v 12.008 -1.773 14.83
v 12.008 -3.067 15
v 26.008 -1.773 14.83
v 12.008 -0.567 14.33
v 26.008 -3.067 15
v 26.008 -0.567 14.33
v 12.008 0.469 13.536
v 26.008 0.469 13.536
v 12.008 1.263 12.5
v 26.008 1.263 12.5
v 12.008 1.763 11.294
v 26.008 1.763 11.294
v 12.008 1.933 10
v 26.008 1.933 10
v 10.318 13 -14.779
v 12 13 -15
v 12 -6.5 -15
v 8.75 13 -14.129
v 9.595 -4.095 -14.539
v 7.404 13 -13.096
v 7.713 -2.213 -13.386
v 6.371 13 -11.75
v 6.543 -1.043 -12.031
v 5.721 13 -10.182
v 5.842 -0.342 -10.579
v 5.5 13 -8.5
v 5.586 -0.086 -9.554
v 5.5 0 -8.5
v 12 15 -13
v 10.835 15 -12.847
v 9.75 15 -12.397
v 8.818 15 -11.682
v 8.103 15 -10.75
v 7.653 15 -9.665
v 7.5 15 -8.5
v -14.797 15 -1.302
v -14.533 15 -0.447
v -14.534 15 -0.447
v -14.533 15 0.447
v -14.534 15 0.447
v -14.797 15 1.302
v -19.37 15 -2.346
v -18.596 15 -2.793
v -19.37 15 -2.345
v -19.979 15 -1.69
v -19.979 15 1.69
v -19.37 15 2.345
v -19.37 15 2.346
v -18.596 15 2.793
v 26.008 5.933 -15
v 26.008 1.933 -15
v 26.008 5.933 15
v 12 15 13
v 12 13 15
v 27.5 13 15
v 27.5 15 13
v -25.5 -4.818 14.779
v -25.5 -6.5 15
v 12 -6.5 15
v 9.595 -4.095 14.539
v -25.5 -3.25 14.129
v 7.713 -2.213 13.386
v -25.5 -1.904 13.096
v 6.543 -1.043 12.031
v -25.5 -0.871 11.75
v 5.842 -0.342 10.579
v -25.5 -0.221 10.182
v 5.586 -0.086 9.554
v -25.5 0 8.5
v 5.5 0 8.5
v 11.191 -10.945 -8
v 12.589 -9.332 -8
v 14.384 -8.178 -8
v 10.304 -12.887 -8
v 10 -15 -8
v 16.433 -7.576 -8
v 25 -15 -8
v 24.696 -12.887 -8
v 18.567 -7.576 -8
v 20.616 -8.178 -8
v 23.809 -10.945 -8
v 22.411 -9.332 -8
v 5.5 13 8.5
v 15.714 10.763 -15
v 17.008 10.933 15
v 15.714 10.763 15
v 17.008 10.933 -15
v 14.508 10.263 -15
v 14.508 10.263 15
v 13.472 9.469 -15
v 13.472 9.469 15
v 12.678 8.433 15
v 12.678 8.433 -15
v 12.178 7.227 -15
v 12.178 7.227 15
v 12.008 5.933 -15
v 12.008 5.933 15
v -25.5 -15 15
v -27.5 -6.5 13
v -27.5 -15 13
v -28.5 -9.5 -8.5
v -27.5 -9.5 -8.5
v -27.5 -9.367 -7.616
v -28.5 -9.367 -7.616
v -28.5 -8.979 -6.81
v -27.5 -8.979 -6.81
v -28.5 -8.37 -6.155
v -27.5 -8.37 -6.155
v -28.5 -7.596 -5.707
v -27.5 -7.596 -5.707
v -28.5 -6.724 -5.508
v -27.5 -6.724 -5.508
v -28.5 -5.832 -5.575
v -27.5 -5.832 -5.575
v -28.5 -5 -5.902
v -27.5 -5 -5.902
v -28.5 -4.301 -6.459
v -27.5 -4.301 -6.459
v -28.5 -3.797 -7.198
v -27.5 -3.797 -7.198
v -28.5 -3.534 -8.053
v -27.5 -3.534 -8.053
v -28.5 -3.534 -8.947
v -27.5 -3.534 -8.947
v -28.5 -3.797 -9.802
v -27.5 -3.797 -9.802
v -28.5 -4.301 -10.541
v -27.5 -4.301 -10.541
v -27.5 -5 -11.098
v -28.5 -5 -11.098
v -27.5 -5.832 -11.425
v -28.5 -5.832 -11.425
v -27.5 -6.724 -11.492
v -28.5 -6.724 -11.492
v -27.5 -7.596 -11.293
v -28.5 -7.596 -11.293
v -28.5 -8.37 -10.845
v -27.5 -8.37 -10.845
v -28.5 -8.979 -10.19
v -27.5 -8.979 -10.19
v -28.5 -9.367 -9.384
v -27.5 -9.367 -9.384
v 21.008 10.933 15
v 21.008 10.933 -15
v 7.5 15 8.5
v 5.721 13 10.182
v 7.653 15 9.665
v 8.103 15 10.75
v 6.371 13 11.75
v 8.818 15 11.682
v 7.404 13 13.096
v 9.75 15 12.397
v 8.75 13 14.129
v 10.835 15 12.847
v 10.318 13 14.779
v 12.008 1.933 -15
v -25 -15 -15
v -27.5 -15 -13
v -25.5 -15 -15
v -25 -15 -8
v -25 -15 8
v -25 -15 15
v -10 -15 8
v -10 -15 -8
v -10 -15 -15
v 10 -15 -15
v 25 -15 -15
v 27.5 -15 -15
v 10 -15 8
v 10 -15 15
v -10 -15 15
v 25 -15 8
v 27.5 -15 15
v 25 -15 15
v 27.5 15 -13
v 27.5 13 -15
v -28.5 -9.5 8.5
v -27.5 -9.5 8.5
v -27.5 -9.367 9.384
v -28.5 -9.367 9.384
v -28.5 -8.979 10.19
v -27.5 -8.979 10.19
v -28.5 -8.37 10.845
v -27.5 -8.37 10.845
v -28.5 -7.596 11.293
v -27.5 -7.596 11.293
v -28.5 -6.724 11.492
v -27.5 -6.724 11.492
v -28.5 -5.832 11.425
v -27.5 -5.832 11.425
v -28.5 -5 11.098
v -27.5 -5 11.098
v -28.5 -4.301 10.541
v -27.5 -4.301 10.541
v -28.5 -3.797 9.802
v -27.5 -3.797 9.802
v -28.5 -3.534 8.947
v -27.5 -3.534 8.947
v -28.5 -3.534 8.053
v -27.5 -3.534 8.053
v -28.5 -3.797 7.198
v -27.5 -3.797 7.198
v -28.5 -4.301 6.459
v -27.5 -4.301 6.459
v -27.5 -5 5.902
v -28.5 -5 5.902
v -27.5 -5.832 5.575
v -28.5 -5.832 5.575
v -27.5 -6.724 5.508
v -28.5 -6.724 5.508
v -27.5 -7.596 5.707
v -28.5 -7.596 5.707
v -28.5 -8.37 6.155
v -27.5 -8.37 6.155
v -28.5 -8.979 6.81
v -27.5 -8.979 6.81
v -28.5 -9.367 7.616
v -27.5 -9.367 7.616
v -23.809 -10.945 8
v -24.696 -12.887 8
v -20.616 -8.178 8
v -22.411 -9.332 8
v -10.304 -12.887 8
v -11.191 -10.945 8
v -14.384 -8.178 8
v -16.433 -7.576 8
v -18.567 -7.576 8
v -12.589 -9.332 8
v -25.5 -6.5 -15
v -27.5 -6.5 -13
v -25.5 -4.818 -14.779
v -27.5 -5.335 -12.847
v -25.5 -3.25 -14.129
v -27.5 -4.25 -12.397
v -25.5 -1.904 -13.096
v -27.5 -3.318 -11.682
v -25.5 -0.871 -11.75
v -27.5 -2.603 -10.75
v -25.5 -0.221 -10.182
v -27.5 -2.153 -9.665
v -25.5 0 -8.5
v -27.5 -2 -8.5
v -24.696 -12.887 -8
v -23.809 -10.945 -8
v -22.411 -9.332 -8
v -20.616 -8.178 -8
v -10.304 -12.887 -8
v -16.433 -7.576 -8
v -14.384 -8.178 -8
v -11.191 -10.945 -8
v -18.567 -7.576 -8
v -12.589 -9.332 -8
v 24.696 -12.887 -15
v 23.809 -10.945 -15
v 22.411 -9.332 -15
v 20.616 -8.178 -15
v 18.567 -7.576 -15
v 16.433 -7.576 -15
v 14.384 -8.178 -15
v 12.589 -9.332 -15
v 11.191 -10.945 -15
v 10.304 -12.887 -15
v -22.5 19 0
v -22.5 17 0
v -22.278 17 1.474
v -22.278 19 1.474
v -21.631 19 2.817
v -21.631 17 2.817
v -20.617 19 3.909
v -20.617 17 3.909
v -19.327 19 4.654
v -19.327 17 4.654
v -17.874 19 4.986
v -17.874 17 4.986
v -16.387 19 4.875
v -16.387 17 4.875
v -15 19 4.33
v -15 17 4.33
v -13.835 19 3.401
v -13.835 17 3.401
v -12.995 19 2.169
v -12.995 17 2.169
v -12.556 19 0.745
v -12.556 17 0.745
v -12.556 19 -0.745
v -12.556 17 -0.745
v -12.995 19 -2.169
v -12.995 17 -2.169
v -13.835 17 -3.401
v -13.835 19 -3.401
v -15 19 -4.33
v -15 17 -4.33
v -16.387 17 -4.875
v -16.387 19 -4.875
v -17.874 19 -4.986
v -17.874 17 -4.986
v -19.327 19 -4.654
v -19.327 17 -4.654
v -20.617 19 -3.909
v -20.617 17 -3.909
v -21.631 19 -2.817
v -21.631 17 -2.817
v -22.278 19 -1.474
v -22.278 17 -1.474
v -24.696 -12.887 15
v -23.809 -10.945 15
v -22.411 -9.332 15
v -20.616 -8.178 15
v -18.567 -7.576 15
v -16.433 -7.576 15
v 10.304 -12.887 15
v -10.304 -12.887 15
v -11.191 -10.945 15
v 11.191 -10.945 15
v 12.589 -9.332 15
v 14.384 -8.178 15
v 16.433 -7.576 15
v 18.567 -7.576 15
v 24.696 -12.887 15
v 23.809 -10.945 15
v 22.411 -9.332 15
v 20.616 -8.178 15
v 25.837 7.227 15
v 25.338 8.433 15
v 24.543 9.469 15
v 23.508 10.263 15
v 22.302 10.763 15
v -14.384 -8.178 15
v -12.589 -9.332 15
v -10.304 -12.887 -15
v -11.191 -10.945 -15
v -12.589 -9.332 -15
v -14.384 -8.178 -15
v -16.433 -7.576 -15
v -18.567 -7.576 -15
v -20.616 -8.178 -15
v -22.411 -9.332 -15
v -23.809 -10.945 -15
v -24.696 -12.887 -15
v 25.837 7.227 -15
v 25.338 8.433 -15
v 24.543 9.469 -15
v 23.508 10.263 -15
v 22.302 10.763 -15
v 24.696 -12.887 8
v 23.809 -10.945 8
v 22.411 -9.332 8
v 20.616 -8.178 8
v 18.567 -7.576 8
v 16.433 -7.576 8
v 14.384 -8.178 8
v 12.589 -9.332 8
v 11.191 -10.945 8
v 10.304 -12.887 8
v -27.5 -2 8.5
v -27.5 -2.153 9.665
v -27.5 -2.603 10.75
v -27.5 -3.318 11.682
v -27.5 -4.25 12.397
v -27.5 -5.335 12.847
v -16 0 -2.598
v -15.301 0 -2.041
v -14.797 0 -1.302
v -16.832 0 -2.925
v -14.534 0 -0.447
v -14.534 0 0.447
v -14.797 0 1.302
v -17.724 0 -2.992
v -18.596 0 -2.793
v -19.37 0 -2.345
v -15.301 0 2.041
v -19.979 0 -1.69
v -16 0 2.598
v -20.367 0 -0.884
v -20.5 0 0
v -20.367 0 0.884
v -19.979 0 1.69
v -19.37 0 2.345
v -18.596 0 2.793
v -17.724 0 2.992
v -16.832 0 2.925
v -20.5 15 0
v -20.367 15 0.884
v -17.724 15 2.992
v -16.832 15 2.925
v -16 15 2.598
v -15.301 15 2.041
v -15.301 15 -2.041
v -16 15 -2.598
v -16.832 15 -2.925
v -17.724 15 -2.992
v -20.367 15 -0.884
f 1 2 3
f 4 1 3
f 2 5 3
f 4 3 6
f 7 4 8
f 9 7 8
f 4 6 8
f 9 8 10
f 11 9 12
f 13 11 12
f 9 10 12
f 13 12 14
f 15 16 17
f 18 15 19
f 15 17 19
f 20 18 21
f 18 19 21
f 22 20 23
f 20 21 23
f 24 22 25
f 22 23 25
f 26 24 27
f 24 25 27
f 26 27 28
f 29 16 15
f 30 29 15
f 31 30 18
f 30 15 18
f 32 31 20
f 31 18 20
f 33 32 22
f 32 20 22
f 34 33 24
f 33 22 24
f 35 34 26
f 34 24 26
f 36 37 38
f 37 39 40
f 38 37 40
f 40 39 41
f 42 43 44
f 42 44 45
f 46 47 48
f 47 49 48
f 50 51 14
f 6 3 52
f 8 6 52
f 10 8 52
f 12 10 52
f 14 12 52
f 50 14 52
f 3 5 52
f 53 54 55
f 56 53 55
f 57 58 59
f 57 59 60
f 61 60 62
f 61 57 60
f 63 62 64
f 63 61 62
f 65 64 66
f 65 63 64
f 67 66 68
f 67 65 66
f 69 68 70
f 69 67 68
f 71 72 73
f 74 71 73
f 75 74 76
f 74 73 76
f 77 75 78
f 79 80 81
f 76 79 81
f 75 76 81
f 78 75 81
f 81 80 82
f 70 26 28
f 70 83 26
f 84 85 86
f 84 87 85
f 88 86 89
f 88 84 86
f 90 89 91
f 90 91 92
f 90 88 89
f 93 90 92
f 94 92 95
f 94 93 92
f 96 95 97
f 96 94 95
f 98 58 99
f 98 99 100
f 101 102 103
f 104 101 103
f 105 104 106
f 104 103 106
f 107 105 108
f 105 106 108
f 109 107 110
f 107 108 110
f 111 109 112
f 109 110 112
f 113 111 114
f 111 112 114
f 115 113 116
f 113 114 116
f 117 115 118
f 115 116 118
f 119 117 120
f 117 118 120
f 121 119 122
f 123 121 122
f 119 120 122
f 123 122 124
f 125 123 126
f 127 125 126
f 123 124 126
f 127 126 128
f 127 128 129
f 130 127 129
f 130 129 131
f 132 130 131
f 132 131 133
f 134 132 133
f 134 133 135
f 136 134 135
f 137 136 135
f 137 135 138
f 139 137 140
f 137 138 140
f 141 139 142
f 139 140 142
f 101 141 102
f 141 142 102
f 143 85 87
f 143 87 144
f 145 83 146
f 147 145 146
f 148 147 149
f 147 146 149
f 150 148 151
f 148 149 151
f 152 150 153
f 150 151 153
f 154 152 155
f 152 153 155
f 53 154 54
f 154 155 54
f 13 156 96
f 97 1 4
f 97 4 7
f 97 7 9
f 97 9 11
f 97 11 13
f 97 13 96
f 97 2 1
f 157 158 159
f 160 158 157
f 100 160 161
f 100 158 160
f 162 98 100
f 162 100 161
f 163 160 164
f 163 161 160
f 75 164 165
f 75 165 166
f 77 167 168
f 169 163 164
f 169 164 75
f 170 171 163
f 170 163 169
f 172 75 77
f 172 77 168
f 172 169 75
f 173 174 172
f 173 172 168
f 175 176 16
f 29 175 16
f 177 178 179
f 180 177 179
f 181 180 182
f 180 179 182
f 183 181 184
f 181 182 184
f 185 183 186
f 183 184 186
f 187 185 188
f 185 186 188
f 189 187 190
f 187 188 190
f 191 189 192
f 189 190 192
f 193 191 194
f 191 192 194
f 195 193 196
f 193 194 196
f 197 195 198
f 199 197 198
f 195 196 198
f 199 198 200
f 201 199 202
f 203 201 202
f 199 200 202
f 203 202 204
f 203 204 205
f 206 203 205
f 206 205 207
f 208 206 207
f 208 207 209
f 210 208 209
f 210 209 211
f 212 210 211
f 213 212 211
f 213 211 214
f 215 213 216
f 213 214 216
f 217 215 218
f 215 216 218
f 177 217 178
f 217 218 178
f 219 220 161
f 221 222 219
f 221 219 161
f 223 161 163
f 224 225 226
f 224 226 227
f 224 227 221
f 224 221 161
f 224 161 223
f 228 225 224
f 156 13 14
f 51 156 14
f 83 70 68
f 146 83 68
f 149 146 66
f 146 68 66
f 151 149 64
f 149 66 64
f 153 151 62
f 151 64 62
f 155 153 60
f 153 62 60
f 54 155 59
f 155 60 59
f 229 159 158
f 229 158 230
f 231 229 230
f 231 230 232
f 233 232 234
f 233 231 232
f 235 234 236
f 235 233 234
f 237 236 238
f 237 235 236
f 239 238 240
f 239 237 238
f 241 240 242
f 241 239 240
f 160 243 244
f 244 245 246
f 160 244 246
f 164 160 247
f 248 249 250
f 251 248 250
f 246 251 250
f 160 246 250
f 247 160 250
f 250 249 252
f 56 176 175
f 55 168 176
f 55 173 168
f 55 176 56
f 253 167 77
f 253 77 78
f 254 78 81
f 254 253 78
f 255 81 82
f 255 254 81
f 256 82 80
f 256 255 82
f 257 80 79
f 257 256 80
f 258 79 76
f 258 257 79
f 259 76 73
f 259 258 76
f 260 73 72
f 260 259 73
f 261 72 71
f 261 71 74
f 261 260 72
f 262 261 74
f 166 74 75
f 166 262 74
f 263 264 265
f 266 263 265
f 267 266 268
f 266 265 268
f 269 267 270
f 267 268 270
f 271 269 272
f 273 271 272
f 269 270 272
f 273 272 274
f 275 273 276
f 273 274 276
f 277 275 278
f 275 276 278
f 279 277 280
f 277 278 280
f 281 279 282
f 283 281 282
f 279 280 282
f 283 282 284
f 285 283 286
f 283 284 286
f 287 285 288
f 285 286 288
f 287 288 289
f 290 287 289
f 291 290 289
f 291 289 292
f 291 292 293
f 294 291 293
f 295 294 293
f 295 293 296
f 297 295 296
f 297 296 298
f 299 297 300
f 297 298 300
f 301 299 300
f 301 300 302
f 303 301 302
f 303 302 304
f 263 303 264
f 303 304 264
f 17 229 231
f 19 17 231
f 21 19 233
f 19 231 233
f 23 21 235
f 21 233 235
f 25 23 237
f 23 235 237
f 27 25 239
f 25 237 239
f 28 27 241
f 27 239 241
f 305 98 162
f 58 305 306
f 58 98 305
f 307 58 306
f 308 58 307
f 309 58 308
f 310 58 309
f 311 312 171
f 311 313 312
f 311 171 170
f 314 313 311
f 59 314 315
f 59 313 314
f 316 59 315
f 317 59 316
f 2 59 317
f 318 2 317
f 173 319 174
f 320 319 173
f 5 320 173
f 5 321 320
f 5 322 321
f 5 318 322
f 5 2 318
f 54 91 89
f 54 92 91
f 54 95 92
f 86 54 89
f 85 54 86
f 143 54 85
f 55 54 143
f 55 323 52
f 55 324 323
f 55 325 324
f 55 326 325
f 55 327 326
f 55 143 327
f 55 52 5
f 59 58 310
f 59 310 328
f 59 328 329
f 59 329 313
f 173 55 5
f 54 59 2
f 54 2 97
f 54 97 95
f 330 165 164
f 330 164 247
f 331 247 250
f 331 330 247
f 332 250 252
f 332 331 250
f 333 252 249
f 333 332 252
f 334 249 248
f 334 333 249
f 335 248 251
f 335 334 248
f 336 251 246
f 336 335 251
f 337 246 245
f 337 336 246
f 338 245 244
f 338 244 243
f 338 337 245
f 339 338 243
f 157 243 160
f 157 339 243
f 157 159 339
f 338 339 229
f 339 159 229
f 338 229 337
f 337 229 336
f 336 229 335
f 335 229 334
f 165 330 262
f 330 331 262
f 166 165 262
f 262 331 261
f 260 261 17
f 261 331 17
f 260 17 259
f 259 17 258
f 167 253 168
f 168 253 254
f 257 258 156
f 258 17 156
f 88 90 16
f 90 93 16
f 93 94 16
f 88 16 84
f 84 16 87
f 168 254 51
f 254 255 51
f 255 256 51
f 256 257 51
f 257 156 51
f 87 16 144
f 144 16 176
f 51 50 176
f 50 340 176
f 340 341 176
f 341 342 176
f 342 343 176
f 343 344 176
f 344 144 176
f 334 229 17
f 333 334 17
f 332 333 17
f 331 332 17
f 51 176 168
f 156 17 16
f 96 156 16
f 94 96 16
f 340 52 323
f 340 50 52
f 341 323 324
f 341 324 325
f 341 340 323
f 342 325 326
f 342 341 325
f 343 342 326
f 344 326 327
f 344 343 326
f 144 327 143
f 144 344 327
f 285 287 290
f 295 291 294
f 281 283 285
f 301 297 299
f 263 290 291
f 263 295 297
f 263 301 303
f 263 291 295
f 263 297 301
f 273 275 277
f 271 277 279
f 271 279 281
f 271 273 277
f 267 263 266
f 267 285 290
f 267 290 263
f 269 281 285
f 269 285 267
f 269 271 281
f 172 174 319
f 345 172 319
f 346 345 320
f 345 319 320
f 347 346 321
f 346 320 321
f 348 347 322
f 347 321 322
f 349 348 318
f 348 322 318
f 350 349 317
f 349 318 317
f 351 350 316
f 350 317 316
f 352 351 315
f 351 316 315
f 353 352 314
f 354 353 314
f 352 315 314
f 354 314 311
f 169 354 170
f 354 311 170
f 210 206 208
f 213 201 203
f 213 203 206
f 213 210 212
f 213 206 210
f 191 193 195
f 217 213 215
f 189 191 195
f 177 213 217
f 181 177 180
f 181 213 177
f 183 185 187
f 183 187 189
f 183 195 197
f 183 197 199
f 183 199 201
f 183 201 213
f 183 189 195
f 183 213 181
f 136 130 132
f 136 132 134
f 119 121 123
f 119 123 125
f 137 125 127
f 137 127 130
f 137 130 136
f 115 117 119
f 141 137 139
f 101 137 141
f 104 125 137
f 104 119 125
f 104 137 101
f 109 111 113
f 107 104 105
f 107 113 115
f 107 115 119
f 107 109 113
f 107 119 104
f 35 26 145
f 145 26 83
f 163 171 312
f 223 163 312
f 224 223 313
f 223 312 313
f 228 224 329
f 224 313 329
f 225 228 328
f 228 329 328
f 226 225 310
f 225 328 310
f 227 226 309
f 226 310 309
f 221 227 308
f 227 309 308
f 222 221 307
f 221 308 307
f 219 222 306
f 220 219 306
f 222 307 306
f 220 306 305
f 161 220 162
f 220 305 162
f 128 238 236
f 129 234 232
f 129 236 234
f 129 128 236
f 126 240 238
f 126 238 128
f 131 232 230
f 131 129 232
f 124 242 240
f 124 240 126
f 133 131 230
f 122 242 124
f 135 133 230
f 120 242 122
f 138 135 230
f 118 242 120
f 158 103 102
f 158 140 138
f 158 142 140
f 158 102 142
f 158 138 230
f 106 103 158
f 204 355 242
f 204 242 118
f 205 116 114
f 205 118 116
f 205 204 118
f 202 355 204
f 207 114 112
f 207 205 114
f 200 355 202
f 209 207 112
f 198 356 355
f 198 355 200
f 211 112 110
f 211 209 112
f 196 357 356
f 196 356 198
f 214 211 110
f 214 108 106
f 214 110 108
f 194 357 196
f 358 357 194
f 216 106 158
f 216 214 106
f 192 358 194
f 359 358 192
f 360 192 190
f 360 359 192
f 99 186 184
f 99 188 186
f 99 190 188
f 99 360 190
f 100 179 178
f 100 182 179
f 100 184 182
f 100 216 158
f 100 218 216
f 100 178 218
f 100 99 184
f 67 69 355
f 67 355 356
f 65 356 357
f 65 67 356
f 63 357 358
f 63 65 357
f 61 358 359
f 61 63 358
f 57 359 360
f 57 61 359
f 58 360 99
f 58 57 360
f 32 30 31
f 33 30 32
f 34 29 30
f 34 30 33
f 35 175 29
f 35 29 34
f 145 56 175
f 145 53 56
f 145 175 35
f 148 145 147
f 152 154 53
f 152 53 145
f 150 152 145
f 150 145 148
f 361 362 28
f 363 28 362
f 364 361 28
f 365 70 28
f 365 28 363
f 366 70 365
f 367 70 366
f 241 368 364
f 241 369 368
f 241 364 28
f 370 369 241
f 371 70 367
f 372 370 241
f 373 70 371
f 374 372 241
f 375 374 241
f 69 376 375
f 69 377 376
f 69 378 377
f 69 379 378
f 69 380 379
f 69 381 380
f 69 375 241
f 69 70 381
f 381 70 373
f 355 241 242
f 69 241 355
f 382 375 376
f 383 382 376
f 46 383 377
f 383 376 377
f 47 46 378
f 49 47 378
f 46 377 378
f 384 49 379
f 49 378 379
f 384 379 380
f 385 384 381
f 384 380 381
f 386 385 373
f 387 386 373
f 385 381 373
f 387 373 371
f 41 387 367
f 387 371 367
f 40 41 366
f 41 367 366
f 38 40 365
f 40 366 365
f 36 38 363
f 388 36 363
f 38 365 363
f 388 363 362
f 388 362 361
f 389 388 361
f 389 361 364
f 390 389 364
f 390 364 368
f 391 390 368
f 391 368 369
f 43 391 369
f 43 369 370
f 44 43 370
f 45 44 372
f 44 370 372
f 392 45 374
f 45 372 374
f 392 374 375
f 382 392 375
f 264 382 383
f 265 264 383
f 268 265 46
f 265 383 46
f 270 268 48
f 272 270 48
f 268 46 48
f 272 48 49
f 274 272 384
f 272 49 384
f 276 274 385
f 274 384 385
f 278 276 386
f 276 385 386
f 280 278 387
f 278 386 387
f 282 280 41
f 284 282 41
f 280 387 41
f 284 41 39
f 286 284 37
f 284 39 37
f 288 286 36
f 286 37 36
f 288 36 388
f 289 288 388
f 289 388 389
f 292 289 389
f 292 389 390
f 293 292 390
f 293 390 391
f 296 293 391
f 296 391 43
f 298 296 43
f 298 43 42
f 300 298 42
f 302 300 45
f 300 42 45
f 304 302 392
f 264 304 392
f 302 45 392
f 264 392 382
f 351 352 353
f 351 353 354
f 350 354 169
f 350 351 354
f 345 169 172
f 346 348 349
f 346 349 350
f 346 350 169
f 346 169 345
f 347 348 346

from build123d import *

# Parameters (mm, degrees)
F1_DEPTH  = 15
F3_DEPTH  = 7
F4_R      = 6.5
F5_SIZE   = 2
F6_W      = 14
F6_H      = 9
F7_DEPTH  = 30.001
F8_R      = 5
F9_R      = 3
F10_DEPTH = 1
F11_R     = 3
F12_DEPTH = 15
F13_R     = 5
F14_DEPTH = 4
F15_SIZE  = 1.99999


# Not quite as in the source:
# - a fillet or chamfer is up to 0.001 mm smaller than in the source, because OpenCascade refuses the exact size
# - a pattern or mirror of a feature is missing from the dataset's text; its kind, count and spacing are read off the source's solid


with BuildPart() as f1:
    # F0 (on Top) → F1 (new body, symmetric)
    with BuildSketch(Plane.XY):
        Polygon((27.5, 15), (5.5, 15), (5.5, 0), (-27.5, 0), (-27.5, -15), (27.5, -15), align=None)
    extrude(amount=F1_DEPTH, both=True)

    # F2 (on face) → F3 (cut)
    with BuildSketch(Plane.XY.offset(15)):
        with BuildLine():
            Line((-25, -15), (-10, -15))
            ThreePointArc((-10, -15), (-17.5, -7.5), (-25, -15))
        make_face()
        with BuildLine():
            ThreePointArc((25, -15), (17.5, -7.5), (10, -15))
            Line((10, -15), (25, -15))
        make_face()
    f3 = extrude(amount=-F3_DEPTH, mode=Mode.SUBTRACT)

    # F3_copies: F3 across plane
    add(f3.mirror(Plane(origin=(0, 0, 0), x_dir=(-1, 0, 0), z_dir=(0, 0, -1))), mode=Mode.SUBTRACT)

    # F4
    f4_edges = [f1.edges().sort_by_distance(p)[0] for p in [
        (-11, 0, 15),
        (-11, 0, -15),
        (5.5, 7.5, 15),
        (5.5, 7.5, -15),
    ]]
    fillet(f4_edges, radius=F4_R)

    # F5
    f5_edges = [f1.edges().sort_by_distance(p)[0] for p in [
        (5.5, 15, 0),
        (-27.5, 0, 0),
    ]]
    chamfer(f5_edges, length=F5_SIZE)

    # F6 (on face) → F7 (cut, through all)
    with BuildSketch(Plane.XY.offset(15)):
        with Locations((19.0077603161, 6.4331619842)):
            Rectangle(F6_W, F6_H)
    extrude(amount=-F7_DEPTH, mode=Mode.SUBTRACT)

    # F8
    f8_edges = [f1.edges().sort_by_distance(p)[0] for p in [
        (19.00776, 1.933162, 15),
        (26.00776, 10.933162, 0),
        (12.00776, 10.933162, 0),
    ]]
    fillet(f8_edges, radius=F8_R)

    # F9 (on face) → F10 (join)
    with BuildSketch(Plane(origin=(-27.5, 0, 0), x_dir=(0, -1, 0), z_dir=(-1, 0, 0))):
        with Locations((6.5, 8.5)):
            Circle(F9_R)
        with Locations((6.5, -8.5)):
            Circle(F9_R)
    extrude(amount=F10_DEPTH)

    # F11 (on face) → F12 (join)
    with BuildSketch(Plane(origin=(0, 0, 0), x_dir=(-1, 0, 0), z_dir=(0, 1, 0))):
        with Locations((17.5, 0)):
            Circle(F11_R)
    extrude(amount=F12_DEPTH)

    # F13 (on face) → F14 (join)
    with BuildSketch(Plane(origin=(0, 15, 0), x_dir=(-1, 0, 0), z_dir=(0, 1, 0))):
        with Locations((17.5, 0)):
            Circle(F13_R)
    extrude(amount=F14_DEPTH)

    # F15 (size 2 in the source; OpenCascade refuses exactly that, so slightly less here)
    f15_edges = [f1.edges().sort_by_distance(p)[0] for p in [
        (-12.5, 15, 0),
    ]]
    chamfer(f15_edges, length=F15_SIZE)


solid = f1.part
